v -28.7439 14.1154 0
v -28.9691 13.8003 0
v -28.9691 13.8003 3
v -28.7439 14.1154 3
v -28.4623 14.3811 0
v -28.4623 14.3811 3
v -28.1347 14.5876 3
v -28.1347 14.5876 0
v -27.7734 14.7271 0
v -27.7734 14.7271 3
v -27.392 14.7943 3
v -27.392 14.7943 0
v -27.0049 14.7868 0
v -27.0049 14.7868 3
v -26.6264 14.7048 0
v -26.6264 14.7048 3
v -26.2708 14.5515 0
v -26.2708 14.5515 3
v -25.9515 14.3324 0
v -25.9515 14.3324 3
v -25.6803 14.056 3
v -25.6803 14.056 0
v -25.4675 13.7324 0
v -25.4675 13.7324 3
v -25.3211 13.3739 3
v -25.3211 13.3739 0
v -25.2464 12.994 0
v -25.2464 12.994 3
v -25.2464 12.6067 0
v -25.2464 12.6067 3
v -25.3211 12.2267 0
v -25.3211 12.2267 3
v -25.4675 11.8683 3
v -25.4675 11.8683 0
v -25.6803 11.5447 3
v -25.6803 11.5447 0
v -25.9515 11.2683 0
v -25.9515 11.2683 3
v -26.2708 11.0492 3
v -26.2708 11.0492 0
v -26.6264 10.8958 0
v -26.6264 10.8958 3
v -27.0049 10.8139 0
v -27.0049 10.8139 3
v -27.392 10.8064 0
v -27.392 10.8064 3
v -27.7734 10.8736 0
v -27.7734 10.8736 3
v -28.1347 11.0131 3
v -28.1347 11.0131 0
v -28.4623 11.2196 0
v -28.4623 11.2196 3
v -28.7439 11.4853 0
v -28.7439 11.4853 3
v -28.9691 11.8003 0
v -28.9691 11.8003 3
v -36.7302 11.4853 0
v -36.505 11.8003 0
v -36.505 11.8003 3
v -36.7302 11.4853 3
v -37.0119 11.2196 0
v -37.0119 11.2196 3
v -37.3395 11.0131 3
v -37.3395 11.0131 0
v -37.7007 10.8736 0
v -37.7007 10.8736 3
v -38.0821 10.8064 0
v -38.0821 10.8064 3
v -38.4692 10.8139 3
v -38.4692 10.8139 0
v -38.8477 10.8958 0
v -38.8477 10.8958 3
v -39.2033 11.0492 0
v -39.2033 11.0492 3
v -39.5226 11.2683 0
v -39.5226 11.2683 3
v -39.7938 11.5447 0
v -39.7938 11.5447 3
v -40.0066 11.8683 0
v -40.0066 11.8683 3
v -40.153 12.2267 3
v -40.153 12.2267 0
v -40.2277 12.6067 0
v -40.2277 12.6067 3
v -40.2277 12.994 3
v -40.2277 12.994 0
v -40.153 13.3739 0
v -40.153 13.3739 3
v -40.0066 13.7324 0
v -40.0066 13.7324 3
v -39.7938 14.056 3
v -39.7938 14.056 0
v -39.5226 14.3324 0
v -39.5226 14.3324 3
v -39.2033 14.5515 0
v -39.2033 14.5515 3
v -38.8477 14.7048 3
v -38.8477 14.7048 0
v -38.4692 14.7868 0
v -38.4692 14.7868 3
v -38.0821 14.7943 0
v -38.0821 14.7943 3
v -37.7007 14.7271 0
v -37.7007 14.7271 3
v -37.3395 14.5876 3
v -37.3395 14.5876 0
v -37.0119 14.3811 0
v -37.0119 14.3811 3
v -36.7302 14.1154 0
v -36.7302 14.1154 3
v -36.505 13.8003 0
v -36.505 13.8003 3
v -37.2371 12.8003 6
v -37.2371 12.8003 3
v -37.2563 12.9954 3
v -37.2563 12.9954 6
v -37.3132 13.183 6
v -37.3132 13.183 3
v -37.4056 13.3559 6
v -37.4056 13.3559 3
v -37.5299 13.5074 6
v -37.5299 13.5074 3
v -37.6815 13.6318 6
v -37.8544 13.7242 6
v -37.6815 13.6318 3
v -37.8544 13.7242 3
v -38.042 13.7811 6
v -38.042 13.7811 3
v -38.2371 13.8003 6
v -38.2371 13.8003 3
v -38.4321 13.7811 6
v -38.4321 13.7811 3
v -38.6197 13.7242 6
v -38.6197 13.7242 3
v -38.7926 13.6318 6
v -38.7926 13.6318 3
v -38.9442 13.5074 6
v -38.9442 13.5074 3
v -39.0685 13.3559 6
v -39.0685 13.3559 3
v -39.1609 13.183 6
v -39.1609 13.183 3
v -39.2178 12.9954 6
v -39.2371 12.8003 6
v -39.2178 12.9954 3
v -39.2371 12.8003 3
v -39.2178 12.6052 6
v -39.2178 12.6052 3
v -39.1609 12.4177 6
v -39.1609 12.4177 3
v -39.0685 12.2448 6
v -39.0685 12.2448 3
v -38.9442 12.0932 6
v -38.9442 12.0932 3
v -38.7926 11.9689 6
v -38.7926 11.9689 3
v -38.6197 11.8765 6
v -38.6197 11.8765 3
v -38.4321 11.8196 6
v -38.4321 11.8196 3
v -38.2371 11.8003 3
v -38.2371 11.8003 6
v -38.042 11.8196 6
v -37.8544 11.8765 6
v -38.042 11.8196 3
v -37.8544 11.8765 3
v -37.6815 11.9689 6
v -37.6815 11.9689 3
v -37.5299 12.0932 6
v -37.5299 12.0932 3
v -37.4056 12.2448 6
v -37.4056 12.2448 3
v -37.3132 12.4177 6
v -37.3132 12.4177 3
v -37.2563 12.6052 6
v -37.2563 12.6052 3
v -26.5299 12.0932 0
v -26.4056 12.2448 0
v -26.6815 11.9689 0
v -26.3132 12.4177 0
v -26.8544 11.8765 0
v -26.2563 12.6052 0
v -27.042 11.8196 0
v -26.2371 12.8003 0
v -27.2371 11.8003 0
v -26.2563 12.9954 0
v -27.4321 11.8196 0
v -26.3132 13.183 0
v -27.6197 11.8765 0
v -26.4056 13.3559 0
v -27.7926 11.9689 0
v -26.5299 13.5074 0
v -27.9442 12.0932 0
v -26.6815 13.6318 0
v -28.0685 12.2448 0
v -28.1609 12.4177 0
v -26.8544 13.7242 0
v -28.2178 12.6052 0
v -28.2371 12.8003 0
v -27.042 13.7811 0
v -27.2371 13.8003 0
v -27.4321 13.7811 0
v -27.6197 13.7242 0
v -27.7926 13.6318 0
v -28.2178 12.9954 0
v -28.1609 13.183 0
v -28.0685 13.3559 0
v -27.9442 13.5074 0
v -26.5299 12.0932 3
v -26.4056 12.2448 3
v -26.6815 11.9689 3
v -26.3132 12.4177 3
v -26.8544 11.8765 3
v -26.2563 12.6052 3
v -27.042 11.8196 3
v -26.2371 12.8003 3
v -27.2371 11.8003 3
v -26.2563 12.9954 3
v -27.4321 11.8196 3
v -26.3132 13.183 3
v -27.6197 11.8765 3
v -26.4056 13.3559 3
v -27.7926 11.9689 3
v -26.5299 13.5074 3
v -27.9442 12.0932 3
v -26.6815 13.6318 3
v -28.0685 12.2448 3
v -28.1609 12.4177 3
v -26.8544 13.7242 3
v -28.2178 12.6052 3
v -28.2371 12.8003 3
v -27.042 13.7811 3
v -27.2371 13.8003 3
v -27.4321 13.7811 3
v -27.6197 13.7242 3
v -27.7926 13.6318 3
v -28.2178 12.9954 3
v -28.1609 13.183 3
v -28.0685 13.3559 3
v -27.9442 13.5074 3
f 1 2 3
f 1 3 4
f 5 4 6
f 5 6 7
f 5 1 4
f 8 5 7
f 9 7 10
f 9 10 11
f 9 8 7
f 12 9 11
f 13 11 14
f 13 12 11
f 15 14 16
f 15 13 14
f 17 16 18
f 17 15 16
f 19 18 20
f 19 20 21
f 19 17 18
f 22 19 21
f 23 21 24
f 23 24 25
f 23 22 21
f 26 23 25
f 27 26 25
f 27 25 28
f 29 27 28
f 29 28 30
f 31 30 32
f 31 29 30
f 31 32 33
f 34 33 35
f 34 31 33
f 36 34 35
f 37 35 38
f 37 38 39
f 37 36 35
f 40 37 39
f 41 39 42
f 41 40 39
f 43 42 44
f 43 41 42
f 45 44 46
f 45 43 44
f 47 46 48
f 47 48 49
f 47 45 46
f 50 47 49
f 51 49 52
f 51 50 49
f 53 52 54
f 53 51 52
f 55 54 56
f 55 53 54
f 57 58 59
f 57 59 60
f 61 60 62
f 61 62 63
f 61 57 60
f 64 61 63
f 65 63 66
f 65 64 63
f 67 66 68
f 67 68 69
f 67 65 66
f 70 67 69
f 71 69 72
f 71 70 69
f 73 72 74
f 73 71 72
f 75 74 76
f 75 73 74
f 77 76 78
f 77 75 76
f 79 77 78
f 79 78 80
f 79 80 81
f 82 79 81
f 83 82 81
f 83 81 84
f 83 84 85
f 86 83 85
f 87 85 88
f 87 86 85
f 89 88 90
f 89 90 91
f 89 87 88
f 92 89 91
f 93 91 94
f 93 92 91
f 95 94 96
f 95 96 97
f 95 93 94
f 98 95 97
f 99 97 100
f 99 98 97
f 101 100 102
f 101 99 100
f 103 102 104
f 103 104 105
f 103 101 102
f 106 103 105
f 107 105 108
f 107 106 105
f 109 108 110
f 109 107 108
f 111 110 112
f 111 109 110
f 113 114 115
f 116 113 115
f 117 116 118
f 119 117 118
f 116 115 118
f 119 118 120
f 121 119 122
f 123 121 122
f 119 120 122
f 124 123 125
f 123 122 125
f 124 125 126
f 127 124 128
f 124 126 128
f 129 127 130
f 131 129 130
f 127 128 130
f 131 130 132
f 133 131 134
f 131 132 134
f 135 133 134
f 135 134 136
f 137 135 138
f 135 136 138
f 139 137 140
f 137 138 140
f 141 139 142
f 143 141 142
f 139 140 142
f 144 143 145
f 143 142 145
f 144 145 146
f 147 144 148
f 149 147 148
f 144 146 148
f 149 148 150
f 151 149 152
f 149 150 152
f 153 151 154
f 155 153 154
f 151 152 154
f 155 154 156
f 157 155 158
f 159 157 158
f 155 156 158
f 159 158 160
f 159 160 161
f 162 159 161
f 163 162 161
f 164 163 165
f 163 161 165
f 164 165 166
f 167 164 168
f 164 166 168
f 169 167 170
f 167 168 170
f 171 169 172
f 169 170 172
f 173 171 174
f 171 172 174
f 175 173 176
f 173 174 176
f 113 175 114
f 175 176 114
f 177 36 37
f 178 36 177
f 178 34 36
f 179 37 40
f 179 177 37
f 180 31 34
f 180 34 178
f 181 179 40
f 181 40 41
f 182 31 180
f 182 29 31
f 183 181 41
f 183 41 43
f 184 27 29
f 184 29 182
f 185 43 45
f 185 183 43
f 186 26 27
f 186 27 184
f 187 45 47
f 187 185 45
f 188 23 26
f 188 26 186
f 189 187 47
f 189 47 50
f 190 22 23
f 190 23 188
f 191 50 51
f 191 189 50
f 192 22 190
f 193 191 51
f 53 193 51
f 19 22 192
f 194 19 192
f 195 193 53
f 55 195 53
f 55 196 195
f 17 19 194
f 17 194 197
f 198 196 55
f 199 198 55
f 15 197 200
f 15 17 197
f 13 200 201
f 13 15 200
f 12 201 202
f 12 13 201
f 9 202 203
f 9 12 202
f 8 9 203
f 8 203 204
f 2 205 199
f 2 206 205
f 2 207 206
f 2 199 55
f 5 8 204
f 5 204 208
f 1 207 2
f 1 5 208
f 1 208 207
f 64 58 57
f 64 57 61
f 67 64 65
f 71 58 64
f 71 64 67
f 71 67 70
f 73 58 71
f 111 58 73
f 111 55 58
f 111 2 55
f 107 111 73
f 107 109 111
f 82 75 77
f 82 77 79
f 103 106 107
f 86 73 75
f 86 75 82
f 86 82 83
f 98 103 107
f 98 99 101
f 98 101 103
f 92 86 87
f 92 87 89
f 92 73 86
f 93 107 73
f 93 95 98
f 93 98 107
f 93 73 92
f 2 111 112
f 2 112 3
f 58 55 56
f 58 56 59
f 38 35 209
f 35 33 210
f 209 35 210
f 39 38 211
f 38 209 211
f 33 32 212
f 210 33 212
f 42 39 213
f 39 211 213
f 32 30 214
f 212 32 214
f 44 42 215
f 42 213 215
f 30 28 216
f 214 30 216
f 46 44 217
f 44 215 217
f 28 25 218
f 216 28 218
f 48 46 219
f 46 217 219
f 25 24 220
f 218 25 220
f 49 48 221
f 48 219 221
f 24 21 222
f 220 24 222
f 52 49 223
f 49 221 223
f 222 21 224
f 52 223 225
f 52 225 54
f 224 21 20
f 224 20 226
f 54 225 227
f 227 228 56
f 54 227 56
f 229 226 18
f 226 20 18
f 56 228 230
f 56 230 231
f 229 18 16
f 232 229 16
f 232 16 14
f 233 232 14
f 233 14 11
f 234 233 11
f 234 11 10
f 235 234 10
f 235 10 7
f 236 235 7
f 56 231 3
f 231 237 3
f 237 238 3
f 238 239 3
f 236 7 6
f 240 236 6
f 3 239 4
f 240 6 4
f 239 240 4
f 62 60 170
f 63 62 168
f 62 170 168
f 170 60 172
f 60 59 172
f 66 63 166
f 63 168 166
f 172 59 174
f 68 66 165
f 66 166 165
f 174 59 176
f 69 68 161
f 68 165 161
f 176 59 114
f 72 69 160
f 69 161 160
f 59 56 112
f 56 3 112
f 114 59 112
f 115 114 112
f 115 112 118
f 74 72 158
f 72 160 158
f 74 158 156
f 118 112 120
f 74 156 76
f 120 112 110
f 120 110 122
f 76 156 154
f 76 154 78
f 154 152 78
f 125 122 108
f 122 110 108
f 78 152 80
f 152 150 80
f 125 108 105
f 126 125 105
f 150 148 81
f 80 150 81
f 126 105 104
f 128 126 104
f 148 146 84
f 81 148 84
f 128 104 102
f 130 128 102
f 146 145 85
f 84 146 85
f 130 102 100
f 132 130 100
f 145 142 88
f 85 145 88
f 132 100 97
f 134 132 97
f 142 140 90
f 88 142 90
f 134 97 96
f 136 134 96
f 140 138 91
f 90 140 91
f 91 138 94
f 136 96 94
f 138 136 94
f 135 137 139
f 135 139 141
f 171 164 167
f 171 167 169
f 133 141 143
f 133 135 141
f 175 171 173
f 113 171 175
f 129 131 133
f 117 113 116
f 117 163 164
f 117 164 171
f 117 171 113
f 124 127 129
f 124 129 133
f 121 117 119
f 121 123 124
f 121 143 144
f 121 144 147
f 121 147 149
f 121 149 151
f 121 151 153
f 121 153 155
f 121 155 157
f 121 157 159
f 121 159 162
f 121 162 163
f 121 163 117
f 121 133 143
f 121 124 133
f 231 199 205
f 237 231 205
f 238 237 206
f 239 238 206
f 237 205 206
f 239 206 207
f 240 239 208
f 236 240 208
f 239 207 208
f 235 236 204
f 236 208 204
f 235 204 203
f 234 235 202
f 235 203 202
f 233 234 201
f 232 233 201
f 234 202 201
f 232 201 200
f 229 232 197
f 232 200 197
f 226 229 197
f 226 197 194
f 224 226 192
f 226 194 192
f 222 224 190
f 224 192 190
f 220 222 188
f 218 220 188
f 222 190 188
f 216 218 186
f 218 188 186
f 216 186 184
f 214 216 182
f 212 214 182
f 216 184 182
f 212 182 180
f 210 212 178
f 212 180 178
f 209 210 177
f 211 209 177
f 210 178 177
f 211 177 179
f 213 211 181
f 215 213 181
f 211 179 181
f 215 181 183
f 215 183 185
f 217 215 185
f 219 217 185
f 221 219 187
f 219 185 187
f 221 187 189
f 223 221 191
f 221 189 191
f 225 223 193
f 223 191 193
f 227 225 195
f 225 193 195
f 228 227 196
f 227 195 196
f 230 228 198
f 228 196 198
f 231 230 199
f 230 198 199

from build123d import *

# Parameters (mm, degrees)
BOSS_EXTRUDE1_DEPTH = 3
SKETCH3_R           = 1
BOSS_EXTRUDE2_DEPTH = 3
SKETCH4_R           = 1
CUT_EXTRUDE1_DEPTH  = 3


with BuildPart() as part:
    # Sketch2 → Boss-Extrude1 (new body)
    with BuildSketch(Plane.XY):
        with BuildLine():
            Line((-36.5050045, 13.800340042), (-28.969106115, 13.800340042))
            ThreePointArc((-28.969106115, 13.800340042), (-25.237055307, 12.800340042), (-28.969106115, 11.800340042))
            Line((-28.969106115, 11.800340042), (-36.5050045, 11.800340042))
            ThreePointArc((-36.5050045, 11.800340042), (-40.237055307, 12.800340042), (-36.5050045, 13.800340042))
        make_face()
    extrude(amount=BOSS_EXTRUDE1_DEPTH)

    # Sketch3 → Boss-Extrude2 (add)
    with BuildSketch(Plane.XY.offset(3)):
        with Locations((-38.237055307, 12.800340042)):
            Circle(SKETCH3_R)
    extrude(amount=BOSS_EXTRUDE2_DEPTH)

    # Sketch4 → Cut-Extrude1 (cut)
    with BuildSketch(Plane(origin=(0, 0, 0), x_dir=(-1, 0, 0), z_dir=(0, 0, -1))):
        with Locations((27.237055307, 12.800340042)):
            Circle(SKETCH4_R)
    extrude(amount=-CUT_EXTRUDE1_DEPTH, mode=Mode.SUBTRACT)


solid = part.part
